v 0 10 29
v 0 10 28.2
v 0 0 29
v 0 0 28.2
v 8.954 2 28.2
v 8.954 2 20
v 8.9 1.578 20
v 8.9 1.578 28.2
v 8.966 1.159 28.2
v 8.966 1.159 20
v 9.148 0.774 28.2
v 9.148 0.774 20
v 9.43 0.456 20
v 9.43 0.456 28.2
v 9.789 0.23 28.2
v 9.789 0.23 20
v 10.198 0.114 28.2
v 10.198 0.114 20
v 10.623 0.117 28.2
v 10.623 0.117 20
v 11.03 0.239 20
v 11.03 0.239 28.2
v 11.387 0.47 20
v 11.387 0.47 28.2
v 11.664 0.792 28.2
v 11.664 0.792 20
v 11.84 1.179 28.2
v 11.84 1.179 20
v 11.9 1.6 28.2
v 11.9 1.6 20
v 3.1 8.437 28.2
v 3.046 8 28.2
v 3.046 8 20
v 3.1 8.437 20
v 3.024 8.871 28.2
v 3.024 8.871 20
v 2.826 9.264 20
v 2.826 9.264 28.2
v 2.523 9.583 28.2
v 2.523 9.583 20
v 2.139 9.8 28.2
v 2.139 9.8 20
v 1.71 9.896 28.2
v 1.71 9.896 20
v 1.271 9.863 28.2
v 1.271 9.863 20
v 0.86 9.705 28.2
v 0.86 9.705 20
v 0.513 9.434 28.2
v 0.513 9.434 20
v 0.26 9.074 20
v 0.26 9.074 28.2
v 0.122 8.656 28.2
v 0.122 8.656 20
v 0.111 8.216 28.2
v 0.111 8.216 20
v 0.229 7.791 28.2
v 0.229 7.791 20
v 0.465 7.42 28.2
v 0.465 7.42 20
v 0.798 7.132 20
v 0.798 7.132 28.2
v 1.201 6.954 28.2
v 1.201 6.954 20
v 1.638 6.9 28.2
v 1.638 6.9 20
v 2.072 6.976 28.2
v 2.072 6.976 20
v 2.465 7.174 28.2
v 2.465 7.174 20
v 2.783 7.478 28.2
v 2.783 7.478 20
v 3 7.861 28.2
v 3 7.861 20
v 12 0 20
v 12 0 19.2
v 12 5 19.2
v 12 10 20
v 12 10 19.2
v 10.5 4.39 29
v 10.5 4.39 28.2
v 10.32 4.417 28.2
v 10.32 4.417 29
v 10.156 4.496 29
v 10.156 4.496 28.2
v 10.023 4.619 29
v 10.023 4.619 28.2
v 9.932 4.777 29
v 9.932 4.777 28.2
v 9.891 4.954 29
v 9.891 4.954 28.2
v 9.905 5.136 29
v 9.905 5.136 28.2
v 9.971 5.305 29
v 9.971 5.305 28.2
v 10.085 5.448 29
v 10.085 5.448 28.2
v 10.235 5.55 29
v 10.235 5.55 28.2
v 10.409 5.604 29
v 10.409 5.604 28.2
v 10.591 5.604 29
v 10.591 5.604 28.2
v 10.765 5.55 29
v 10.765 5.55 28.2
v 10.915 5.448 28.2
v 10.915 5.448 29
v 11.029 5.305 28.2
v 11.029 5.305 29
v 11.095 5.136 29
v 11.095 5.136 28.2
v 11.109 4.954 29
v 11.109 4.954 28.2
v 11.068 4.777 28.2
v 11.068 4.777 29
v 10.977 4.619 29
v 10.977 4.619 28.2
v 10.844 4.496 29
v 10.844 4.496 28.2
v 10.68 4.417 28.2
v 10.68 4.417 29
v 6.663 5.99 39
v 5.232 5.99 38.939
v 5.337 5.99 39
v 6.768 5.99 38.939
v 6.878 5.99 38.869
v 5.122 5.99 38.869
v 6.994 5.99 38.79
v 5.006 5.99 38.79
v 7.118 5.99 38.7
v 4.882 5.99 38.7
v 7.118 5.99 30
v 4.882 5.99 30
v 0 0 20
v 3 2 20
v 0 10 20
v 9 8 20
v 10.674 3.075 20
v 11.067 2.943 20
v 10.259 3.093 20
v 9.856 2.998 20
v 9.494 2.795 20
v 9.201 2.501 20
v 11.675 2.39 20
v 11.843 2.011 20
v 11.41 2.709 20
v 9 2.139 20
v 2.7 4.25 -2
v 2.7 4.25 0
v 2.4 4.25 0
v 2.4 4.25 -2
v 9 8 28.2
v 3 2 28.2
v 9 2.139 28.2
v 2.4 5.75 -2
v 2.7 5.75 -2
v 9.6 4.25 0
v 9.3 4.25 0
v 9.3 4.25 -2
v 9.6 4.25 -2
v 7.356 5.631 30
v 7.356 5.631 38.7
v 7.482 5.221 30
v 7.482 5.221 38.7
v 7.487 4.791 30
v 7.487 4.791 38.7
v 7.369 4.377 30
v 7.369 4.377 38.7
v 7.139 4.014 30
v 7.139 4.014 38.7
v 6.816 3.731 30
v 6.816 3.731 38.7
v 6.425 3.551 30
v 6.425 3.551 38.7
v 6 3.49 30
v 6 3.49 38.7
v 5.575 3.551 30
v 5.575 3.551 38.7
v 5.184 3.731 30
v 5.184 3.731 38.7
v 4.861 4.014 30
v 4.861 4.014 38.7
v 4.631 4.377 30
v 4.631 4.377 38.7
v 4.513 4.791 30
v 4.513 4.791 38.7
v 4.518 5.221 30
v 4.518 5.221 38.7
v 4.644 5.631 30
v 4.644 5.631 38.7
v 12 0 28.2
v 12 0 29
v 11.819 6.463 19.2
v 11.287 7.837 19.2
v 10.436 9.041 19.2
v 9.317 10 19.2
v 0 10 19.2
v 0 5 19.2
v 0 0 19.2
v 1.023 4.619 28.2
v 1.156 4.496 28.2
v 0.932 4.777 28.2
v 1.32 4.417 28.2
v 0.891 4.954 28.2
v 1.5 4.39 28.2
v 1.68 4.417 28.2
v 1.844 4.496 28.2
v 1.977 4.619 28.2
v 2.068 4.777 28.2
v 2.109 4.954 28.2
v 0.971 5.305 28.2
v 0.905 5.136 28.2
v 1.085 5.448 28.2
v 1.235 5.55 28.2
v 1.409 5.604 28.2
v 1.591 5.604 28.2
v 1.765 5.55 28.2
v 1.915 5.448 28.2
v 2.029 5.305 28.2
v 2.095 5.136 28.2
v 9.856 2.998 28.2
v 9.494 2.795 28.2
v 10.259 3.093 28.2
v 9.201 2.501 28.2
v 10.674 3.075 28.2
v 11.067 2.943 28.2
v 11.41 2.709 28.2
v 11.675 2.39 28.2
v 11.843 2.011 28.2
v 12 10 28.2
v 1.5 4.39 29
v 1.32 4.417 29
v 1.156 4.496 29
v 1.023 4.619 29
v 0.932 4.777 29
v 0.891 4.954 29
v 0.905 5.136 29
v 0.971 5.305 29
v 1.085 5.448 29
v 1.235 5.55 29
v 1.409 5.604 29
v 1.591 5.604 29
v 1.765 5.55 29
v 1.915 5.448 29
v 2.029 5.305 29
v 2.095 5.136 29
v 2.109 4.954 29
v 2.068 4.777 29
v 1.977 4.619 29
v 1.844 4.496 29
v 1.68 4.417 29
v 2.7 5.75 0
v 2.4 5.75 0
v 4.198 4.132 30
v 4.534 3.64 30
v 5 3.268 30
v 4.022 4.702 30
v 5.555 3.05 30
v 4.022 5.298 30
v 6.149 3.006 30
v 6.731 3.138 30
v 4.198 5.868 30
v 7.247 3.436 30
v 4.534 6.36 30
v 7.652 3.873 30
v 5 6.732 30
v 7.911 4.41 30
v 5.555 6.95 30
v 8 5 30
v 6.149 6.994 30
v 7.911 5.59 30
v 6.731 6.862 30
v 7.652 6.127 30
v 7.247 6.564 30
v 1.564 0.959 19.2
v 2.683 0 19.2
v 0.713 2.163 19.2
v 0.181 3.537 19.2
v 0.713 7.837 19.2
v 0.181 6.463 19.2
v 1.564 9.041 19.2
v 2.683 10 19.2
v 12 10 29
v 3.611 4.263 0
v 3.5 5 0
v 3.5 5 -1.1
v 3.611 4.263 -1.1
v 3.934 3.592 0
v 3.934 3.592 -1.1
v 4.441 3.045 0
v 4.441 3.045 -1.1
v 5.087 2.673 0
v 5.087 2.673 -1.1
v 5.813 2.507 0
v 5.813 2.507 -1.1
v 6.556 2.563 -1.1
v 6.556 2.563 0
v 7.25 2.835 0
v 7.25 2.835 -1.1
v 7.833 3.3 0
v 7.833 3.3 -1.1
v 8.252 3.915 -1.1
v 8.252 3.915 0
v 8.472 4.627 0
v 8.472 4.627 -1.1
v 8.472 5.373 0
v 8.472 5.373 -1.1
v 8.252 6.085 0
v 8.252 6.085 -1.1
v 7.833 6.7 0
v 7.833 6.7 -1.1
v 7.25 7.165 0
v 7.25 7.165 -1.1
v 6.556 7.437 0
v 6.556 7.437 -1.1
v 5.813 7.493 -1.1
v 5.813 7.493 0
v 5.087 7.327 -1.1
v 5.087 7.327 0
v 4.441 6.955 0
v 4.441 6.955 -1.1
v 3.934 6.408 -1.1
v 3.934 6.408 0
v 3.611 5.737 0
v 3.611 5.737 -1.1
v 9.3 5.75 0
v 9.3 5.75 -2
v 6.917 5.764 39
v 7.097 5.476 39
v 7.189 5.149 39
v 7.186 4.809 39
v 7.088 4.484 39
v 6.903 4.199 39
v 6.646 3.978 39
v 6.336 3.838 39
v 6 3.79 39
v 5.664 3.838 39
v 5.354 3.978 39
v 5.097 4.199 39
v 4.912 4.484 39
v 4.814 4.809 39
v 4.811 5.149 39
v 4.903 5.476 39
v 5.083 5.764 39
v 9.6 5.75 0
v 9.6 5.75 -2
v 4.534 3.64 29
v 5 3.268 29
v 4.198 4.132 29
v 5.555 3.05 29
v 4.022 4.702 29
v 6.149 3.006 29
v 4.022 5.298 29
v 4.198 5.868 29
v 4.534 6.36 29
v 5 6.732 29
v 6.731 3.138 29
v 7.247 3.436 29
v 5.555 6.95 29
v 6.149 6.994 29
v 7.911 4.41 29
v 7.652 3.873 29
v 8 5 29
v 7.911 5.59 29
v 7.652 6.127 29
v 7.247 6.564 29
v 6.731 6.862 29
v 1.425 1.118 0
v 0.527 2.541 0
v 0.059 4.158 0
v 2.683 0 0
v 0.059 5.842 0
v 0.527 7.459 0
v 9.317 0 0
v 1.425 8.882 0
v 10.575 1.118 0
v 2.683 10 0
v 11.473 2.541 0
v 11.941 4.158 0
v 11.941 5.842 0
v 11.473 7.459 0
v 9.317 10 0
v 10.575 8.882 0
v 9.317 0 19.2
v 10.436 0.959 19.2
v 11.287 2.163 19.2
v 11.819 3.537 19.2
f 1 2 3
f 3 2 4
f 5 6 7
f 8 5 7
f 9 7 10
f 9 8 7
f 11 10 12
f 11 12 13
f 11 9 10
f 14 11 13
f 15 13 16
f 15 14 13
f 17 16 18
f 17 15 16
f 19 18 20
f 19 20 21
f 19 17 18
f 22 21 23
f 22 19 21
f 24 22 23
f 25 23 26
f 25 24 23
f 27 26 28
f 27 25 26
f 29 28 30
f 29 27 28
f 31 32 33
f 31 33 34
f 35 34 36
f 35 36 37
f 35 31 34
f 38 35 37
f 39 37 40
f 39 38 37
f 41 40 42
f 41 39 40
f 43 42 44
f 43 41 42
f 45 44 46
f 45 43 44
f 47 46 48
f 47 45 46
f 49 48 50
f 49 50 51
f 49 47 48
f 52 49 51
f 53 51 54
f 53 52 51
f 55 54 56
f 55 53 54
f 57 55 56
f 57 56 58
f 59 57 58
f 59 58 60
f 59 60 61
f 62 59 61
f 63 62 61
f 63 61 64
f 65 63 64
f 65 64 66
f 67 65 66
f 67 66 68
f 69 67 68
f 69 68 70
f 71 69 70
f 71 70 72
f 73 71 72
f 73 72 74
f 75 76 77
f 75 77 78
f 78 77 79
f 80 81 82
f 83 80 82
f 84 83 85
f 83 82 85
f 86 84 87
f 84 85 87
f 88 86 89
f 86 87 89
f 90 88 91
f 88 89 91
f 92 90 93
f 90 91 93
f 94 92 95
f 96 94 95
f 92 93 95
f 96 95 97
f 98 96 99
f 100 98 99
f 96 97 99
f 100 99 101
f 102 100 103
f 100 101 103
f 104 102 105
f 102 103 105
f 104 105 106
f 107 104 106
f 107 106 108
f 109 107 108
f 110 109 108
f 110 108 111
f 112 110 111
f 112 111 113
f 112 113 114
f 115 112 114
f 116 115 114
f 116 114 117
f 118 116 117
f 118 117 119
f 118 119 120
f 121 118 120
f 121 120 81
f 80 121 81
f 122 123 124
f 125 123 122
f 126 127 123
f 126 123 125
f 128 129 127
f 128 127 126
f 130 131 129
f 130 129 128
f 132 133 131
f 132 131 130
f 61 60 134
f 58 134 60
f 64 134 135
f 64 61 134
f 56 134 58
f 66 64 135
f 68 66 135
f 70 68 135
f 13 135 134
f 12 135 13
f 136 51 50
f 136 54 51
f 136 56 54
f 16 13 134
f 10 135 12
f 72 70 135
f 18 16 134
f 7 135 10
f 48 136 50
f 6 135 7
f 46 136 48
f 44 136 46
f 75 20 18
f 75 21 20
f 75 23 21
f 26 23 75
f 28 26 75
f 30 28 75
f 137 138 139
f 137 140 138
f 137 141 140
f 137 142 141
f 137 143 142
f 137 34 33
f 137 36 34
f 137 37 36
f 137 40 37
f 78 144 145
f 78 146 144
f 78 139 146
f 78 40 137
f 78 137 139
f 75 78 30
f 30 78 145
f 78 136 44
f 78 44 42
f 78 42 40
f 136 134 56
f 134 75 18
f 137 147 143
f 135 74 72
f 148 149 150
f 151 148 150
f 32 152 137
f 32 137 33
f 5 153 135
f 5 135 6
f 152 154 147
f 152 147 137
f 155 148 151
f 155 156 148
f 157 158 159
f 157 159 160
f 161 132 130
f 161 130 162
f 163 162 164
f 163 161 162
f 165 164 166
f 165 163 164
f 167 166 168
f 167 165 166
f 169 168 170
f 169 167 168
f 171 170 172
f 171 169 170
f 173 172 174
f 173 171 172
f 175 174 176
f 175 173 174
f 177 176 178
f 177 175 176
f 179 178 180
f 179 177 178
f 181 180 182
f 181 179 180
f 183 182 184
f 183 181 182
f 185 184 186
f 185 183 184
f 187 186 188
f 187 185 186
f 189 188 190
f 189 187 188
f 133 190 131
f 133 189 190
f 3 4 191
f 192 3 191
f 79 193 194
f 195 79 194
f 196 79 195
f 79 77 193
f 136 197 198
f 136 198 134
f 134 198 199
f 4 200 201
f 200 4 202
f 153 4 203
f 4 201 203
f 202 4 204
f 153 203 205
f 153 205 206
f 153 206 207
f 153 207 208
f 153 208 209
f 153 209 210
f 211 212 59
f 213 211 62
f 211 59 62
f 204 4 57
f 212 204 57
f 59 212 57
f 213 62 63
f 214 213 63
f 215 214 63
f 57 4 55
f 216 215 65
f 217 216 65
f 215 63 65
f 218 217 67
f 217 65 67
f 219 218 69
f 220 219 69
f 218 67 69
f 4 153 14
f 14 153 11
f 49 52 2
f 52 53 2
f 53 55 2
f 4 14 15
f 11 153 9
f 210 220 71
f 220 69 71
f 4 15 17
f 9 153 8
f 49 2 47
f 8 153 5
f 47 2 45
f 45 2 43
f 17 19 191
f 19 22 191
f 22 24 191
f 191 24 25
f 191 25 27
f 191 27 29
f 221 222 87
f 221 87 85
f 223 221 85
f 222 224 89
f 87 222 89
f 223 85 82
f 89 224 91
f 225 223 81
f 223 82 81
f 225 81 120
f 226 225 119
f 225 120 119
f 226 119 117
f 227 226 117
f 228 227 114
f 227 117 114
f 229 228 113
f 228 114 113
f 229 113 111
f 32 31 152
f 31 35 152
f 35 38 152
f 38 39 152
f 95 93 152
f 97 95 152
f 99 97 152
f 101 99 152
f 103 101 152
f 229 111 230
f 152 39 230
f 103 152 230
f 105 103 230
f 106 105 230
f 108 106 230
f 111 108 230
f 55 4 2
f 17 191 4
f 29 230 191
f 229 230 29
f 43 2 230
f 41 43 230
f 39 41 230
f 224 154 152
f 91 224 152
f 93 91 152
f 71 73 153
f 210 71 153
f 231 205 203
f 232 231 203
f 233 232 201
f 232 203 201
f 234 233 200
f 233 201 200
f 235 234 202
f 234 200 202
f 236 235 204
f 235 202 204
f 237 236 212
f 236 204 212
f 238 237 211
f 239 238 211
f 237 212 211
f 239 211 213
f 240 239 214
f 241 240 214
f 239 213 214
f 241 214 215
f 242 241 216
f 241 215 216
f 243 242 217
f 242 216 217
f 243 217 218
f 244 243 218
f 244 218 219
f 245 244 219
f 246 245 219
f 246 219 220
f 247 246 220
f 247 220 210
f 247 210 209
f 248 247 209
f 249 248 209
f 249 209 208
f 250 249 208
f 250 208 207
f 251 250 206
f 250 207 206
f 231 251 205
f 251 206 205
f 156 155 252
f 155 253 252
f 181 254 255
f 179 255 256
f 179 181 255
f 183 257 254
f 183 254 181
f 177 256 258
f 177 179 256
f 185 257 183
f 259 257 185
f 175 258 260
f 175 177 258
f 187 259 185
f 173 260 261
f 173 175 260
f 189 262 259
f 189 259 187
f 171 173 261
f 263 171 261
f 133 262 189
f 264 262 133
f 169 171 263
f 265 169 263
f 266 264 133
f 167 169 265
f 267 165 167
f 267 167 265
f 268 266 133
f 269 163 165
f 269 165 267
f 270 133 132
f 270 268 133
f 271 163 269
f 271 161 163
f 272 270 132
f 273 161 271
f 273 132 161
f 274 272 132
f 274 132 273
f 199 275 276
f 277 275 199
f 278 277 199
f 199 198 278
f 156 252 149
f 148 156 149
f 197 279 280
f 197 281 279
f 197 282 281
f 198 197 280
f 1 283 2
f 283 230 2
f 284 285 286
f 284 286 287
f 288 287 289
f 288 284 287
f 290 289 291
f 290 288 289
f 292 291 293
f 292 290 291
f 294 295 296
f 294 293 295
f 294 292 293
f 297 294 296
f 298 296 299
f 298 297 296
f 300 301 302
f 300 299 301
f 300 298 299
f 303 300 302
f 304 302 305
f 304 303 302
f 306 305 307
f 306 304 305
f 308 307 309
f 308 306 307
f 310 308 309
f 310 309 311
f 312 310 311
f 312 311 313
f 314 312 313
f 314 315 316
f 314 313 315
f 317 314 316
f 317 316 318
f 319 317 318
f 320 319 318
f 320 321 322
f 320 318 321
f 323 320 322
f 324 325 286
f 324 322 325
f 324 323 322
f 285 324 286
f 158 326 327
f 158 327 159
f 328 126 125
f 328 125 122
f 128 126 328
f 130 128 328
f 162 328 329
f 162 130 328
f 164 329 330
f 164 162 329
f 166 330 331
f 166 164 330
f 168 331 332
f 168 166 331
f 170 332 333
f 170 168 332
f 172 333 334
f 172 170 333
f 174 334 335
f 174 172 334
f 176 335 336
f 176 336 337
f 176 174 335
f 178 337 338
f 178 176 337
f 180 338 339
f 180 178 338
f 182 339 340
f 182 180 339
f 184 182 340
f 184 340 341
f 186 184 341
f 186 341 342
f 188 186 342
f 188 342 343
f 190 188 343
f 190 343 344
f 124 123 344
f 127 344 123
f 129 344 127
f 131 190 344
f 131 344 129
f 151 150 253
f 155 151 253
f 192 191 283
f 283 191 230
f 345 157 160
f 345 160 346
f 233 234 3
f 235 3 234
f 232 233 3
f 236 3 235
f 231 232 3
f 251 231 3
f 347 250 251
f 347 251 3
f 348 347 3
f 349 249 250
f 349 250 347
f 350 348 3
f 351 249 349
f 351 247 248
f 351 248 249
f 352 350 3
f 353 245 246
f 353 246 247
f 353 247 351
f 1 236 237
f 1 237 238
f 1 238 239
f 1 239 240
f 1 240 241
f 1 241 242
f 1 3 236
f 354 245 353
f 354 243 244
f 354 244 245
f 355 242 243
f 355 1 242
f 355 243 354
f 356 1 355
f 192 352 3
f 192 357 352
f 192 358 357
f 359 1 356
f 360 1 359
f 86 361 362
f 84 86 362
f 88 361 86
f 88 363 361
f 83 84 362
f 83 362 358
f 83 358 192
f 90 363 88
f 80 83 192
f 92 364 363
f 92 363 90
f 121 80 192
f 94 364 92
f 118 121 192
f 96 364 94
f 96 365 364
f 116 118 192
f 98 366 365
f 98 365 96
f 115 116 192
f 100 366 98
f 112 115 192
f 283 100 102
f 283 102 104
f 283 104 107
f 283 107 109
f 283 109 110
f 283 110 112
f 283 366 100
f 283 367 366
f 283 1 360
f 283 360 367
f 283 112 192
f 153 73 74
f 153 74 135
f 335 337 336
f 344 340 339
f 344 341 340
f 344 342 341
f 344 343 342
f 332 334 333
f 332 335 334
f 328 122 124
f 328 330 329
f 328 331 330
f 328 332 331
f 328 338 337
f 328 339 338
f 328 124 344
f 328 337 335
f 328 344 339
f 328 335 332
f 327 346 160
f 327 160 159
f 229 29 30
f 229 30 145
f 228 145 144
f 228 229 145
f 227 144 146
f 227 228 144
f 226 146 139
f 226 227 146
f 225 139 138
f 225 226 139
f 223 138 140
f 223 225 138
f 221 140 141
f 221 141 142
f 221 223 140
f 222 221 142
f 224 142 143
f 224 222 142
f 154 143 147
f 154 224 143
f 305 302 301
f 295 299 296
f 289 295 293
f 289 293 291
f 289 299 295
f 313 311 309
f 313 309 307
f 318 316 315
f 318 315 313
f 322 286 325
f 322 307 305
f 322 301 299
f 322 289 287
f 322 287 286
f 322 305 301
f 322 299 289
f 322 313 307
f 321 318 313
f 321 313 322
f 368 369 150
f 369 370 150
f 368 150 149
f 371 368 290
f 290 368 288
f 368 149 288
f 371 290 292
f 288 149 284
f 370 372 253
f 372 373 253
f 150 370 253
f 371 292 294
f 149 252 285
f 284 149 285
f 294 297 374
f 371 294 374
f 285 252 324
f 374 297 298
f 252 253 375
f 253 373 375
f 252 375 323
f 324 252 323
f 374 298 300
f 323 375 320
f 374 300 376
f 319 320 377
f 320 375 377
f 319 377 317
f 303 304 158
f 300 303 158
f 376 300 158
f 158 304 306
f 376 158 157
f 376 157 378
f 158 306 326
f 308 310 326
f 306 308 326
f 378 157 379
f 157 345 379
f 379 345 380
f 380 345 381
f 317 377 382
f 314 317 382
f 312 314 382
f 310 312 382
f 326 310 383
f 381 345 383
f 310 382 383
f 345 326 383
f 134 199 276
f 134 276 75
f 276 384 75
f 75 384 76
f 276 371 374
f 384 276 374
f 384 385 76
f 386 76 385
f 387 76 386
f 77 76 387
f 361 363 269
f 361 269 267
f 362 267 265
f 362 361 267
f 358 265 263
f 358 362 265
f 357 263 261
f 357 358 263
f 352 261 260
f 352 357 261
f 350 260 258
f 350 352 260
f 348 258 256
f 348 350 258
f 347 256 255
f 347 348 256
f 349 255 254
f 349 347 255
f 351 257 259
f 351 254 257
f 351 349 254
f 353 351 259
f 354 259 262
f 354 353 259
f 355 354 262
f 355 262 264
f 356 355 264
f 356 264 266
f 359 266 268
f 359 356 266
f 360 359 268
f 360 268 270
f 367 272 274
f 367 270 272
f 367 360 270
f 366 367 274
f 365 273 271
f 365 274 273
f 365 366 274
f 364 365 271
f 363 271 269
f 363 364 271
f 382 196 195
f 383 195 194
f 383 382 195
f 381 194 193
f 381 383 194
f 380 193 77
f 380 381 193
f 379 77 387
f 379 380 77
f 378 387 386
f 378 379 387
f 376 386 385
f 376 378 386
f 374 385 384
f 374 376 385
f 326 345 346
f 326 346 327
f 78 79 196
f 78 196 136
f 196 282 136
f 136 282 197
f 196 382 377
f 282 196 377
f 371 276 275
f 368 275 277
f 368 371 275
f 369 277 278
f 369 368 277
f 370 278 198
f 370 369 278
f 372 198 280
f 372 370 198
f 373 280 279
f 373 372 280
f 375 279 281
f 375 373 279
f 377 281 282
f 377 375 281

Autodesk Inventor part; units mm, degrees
ref_plane "YZ Plane" through (0, 0, 0) normal (1, 0, 0) x (0, 1, 0)
ref_plane "XZ Plane" through (0, 0, 0) normal (0, 1, 0) x (-1, 0, 0)
sketch "Sketch1" plane through (0, 0, 0) normal (0, 0, 1) x (1, 0, 0)
  line L0 (0, 0) -> (12, 0)
  line L1 (12, 0) -> (12, 10)
  line L2 (12, 10) -> (0, 10)
  line L3 (0, 10) -> (0, 0)
  dimension "d0" = 10
  dimension "d1" = 12
extrude "Extrusion1" add sketch "Sketch1" along normal blind 20
sketch "Sketch2" plane through (0, 0, 20) normal (0, 0, 1) x (1, 0, 0)
  line L0 (12, 0) -> (12, 10) projected
  line L1 (0, 0) -> (12, 0)
  line L2 (12, 0) -> (12, 10)
  line L3 (12, 10) -> (0, 10)
  line L4 (0, 10) -> (0, 0)
extrude "Extrusion2" add sketch "Sketch2" along normal blind 9
sketch "Sketch3" plane through (0, 0, 29) normal (0, 0, 1) x (1, 0, 0)
  line L0 (12, 10) -> (0, 10) projected
  line L1 (0, 10) -> (0, 0) projected
  line L2 (12, 0) -> (12, 10) projected
  point P0 (1.5, 5)
  point P1 (10.5, 5)
  dimension "d6" = 5
  dimension "d7" = 5
  dimension "d8" = 9
  dimension "d9" = 1.5
  dimension "d10" = 1.5
hole "Hole1" at (1.5, 5, 29) at (10.5, 5, 29) direction (0, 0, -1) diameter 1.221 depth 0.8 thread size "M1.6x0.35" class "6H" standard "ISO Metric profile"
ref_plane "Work Plane1" through (0, 0, 28.2) normal (0, 0, 1) x (1, 0, 0)
sketch "Sketch4" plane through (0, 0, 28.2) normal (0, 0, 1) x (1, 0, 0)
  line L0 (0, 10) -> (0, 0) projected
  line L1 (12, 0) -> (12, 10) projected
  line L2 (0, 0) -> (12, 0)
  line L3 (12, 0) -> (12, 10)
  line L4 (12, 10) -> (0, 10)
  line L5 (0, 10) -> (0, 0)
  line L6 (3, 2) -> (9, 2)
  line L7 (9, 2) -> (9, 8)
  line L8 (9, 8) -> (3, 8)
  line L9 (3, 8) -> (3, 2)
  circle A0 centre (10.5, 5) radius 0.6105 projected
  circle A1 centre (1.5, 5) radius 0.6105 projected
  point P0 (6, 5)
  dimension "d19" = 2
  dimension "d20" = 2
  dimension "d21" = 1.5
  dimension "d22" = 1.5
extrude "Extrusion3" cut sketch "Sketch4" against normal blind 8.2 contours L4 L1 L2 L0 | A0 | A1
sketch "Sketch5" plane through (0, 0, 28.2) normal (0, 0, 1) x (1, 0, 0)
  line L0 (12, 10) -> (0, 10) projected
  line L1 (0, 10) -> (0, 0) projected
  line L2 (12, 0) -> (12, 10) projected
  line L3 (0, 0) -> (12, 0) projected
  circle A0 centre (1.6, 8.4) radius 1.5
  circle A1 centre (10.4, 1.6) radius 1.5
  dimension "d25" = 1.6
  dimension "d26" = 1.6
  dimension "d27" = 1.6
  dimension "d28" = 1.6
  dimension "d29" = 3
extrude "Extrusion4" add sketch "Sketch5" against normal up to surface (8.2 mm away) contours A0 | A1
sketch "Sketch6" plane through (0, 0, 29) normal (0, 0, 1) x (1, 0, 0)
  line L0 (12, 10) -> (0, 10) projected
  line L1 (0, 0) -> (12, 0) projected
  line L2 (12, 0) -> (12, 10) projected
  line L3 (0, 10) -> (0, 0) projected
  circle A0 centre (6, 5) radius 2
  dimension "d32" = 5
  dimension "d33" = 5
  dimension "d34" = 6
  dimension "d35" = 6
  dimension "d36" = 4
extrude "Extrusion5" add sketch "Sketch6" along normal blind 1 contours A0
sketch "Sketch7" plane through (6, 5, 30) normal (0, 0, 1) x (1, 0, 0)
  circle A0 centre (0, -0.0104) radius 1.5
  line L0 (-1.118, 0.9896) -> (1.118, 0.9896)
  point P0 (-6, -5)
  point P1 (0, -1.5104)
  dimension "d39" = 3
  dimension "d40" = 2.5
extrude "Extrusion6" add sketch "Sketch7" along normal blind 9 contours A0 L0 picked at (0.0594, 0.1598)
chamfer "Chamfer1" distance 0.3 angle 45 1 edges at (6, 3.4896, 39)
sketch "Sketch8" plane through (0, 0, 0) normal (0, 0, -1) x (-1, 0, 0)
  line L0 (-12, 10) -> (0, 10) projected
  line L1 (-12, 0) -> (-12, 10) projected
  circle A0 centre (-6, 5) radius 6
  line L2 (-12, 10) -> (-12, 0) projected
  line L3 (0, 0) -> (-12, 0)
  line L4 (-12, 0) -> (-12, 10)
  line L5 (-12, 10) -> (0, 10)
  line L6 (0, 10) -> (0, 0)
  point P0 (0, 5)
  point P1 (0, 10)
  point P2 (-2.6834, 10)
  point P3 (-2.6834, 0)
  point P4 (-9.3166, 0)
  point P5 (-12, 5)
  point P6 (-9.3166, 10)
  dimension "d46" = 5
  dimension "d47" = 6
extrude "Extrusion7" cut sketch "Sketch8" against normal blind 19.2 contours L0 A0 L1 | A0 L3 L1 | L0 L6 A0 | L6 L3 A0
sketch "Sketch9" plane through (0, 0, 0) normal (0, 0, -1) x (-1, 0, 0)
  arc A0 (-9.3166, 10) -> (-9.3166, 0) centre (-6, 5) ccw projected
  line L0 (-12, 5) -> (-12, 10) projected
  line L1 (0, 5) -> (0, 0) projected
  line L2 (-9.3, 4.25) -> (-9.6, 4.25)
  line L3 (-9.6, 4.25) -> (-9.6, 5.75)
  line L4 (-9.6, 5.75) -> (-9.3, 5.75)
  line L5 (-9.3, 5.75) -> (-9.3, 4.25)
  line L6 (-9.3, 4.25) -> (-9.6, 5.75) construction
  line L7 (-9.6, 4.25) -> (-9.3, 5.75) construction
  line L8 (-2.7, 4.25) -> (-2.4, 4.25)
  line L9 (-2.4, 4.25) -> (-2.4, 5.75)
  line L10 (-2.4, 5.75) -> (-2.7, 5.75)
  line L11 (-2.7, 5.75) -> (-2.7, 4.25)
  line L12 (-2.7, 4.25) -> (-2.4, 5.75) construction
  line L13 (-2.4, 4.25) -> (-2.7, 5.75) construction
  point P0 (-9.45, 5)
  point P1 (-2.55, 5)
  dimension "d50" = 6.9
  dimension "d51" = 0
  dimension "d52" = 0
  dimension "d53" = 2.55
  dimension "d54" = 2.55
  dimension "d55" = 1.5
  dimension "d56" = 0.3
extrude "Extrusion8" add sketch "Sketch9" along normal blind 2
sketch "Sketch10" plane through (0, 0, 0) normal (0, 0, -1) x (-1, 0, 0)
  line L0 (-9.3166, 10) -> (-2.6834, 10) projected
  line L1 (-12, 0) -> (-12, 5) projected
  circle A0 centre (-6, 5) radius 2.5
  point P0 (0, 0)
  dimension "d59" = 5
  dimension "d60" = 6
  dimension "d61" = 5
extrude "Extrusion9" add sketch "Sketch10" along normal blind 1.1
equation "\"d7\" = d6"
equation "\"d9\" = d10"
equation "\"d20\" = d19"
equation "\"d22\" = d21"
equation "\"d26\" = d25"
equation "\"d27\" = d26"
equation "\"d28\" = d27"
equation "\"d32\" = d33"
equation "\"d34\" = d35"
equation "\"d53\" = d54"
properties part number "N30 gear motor"
